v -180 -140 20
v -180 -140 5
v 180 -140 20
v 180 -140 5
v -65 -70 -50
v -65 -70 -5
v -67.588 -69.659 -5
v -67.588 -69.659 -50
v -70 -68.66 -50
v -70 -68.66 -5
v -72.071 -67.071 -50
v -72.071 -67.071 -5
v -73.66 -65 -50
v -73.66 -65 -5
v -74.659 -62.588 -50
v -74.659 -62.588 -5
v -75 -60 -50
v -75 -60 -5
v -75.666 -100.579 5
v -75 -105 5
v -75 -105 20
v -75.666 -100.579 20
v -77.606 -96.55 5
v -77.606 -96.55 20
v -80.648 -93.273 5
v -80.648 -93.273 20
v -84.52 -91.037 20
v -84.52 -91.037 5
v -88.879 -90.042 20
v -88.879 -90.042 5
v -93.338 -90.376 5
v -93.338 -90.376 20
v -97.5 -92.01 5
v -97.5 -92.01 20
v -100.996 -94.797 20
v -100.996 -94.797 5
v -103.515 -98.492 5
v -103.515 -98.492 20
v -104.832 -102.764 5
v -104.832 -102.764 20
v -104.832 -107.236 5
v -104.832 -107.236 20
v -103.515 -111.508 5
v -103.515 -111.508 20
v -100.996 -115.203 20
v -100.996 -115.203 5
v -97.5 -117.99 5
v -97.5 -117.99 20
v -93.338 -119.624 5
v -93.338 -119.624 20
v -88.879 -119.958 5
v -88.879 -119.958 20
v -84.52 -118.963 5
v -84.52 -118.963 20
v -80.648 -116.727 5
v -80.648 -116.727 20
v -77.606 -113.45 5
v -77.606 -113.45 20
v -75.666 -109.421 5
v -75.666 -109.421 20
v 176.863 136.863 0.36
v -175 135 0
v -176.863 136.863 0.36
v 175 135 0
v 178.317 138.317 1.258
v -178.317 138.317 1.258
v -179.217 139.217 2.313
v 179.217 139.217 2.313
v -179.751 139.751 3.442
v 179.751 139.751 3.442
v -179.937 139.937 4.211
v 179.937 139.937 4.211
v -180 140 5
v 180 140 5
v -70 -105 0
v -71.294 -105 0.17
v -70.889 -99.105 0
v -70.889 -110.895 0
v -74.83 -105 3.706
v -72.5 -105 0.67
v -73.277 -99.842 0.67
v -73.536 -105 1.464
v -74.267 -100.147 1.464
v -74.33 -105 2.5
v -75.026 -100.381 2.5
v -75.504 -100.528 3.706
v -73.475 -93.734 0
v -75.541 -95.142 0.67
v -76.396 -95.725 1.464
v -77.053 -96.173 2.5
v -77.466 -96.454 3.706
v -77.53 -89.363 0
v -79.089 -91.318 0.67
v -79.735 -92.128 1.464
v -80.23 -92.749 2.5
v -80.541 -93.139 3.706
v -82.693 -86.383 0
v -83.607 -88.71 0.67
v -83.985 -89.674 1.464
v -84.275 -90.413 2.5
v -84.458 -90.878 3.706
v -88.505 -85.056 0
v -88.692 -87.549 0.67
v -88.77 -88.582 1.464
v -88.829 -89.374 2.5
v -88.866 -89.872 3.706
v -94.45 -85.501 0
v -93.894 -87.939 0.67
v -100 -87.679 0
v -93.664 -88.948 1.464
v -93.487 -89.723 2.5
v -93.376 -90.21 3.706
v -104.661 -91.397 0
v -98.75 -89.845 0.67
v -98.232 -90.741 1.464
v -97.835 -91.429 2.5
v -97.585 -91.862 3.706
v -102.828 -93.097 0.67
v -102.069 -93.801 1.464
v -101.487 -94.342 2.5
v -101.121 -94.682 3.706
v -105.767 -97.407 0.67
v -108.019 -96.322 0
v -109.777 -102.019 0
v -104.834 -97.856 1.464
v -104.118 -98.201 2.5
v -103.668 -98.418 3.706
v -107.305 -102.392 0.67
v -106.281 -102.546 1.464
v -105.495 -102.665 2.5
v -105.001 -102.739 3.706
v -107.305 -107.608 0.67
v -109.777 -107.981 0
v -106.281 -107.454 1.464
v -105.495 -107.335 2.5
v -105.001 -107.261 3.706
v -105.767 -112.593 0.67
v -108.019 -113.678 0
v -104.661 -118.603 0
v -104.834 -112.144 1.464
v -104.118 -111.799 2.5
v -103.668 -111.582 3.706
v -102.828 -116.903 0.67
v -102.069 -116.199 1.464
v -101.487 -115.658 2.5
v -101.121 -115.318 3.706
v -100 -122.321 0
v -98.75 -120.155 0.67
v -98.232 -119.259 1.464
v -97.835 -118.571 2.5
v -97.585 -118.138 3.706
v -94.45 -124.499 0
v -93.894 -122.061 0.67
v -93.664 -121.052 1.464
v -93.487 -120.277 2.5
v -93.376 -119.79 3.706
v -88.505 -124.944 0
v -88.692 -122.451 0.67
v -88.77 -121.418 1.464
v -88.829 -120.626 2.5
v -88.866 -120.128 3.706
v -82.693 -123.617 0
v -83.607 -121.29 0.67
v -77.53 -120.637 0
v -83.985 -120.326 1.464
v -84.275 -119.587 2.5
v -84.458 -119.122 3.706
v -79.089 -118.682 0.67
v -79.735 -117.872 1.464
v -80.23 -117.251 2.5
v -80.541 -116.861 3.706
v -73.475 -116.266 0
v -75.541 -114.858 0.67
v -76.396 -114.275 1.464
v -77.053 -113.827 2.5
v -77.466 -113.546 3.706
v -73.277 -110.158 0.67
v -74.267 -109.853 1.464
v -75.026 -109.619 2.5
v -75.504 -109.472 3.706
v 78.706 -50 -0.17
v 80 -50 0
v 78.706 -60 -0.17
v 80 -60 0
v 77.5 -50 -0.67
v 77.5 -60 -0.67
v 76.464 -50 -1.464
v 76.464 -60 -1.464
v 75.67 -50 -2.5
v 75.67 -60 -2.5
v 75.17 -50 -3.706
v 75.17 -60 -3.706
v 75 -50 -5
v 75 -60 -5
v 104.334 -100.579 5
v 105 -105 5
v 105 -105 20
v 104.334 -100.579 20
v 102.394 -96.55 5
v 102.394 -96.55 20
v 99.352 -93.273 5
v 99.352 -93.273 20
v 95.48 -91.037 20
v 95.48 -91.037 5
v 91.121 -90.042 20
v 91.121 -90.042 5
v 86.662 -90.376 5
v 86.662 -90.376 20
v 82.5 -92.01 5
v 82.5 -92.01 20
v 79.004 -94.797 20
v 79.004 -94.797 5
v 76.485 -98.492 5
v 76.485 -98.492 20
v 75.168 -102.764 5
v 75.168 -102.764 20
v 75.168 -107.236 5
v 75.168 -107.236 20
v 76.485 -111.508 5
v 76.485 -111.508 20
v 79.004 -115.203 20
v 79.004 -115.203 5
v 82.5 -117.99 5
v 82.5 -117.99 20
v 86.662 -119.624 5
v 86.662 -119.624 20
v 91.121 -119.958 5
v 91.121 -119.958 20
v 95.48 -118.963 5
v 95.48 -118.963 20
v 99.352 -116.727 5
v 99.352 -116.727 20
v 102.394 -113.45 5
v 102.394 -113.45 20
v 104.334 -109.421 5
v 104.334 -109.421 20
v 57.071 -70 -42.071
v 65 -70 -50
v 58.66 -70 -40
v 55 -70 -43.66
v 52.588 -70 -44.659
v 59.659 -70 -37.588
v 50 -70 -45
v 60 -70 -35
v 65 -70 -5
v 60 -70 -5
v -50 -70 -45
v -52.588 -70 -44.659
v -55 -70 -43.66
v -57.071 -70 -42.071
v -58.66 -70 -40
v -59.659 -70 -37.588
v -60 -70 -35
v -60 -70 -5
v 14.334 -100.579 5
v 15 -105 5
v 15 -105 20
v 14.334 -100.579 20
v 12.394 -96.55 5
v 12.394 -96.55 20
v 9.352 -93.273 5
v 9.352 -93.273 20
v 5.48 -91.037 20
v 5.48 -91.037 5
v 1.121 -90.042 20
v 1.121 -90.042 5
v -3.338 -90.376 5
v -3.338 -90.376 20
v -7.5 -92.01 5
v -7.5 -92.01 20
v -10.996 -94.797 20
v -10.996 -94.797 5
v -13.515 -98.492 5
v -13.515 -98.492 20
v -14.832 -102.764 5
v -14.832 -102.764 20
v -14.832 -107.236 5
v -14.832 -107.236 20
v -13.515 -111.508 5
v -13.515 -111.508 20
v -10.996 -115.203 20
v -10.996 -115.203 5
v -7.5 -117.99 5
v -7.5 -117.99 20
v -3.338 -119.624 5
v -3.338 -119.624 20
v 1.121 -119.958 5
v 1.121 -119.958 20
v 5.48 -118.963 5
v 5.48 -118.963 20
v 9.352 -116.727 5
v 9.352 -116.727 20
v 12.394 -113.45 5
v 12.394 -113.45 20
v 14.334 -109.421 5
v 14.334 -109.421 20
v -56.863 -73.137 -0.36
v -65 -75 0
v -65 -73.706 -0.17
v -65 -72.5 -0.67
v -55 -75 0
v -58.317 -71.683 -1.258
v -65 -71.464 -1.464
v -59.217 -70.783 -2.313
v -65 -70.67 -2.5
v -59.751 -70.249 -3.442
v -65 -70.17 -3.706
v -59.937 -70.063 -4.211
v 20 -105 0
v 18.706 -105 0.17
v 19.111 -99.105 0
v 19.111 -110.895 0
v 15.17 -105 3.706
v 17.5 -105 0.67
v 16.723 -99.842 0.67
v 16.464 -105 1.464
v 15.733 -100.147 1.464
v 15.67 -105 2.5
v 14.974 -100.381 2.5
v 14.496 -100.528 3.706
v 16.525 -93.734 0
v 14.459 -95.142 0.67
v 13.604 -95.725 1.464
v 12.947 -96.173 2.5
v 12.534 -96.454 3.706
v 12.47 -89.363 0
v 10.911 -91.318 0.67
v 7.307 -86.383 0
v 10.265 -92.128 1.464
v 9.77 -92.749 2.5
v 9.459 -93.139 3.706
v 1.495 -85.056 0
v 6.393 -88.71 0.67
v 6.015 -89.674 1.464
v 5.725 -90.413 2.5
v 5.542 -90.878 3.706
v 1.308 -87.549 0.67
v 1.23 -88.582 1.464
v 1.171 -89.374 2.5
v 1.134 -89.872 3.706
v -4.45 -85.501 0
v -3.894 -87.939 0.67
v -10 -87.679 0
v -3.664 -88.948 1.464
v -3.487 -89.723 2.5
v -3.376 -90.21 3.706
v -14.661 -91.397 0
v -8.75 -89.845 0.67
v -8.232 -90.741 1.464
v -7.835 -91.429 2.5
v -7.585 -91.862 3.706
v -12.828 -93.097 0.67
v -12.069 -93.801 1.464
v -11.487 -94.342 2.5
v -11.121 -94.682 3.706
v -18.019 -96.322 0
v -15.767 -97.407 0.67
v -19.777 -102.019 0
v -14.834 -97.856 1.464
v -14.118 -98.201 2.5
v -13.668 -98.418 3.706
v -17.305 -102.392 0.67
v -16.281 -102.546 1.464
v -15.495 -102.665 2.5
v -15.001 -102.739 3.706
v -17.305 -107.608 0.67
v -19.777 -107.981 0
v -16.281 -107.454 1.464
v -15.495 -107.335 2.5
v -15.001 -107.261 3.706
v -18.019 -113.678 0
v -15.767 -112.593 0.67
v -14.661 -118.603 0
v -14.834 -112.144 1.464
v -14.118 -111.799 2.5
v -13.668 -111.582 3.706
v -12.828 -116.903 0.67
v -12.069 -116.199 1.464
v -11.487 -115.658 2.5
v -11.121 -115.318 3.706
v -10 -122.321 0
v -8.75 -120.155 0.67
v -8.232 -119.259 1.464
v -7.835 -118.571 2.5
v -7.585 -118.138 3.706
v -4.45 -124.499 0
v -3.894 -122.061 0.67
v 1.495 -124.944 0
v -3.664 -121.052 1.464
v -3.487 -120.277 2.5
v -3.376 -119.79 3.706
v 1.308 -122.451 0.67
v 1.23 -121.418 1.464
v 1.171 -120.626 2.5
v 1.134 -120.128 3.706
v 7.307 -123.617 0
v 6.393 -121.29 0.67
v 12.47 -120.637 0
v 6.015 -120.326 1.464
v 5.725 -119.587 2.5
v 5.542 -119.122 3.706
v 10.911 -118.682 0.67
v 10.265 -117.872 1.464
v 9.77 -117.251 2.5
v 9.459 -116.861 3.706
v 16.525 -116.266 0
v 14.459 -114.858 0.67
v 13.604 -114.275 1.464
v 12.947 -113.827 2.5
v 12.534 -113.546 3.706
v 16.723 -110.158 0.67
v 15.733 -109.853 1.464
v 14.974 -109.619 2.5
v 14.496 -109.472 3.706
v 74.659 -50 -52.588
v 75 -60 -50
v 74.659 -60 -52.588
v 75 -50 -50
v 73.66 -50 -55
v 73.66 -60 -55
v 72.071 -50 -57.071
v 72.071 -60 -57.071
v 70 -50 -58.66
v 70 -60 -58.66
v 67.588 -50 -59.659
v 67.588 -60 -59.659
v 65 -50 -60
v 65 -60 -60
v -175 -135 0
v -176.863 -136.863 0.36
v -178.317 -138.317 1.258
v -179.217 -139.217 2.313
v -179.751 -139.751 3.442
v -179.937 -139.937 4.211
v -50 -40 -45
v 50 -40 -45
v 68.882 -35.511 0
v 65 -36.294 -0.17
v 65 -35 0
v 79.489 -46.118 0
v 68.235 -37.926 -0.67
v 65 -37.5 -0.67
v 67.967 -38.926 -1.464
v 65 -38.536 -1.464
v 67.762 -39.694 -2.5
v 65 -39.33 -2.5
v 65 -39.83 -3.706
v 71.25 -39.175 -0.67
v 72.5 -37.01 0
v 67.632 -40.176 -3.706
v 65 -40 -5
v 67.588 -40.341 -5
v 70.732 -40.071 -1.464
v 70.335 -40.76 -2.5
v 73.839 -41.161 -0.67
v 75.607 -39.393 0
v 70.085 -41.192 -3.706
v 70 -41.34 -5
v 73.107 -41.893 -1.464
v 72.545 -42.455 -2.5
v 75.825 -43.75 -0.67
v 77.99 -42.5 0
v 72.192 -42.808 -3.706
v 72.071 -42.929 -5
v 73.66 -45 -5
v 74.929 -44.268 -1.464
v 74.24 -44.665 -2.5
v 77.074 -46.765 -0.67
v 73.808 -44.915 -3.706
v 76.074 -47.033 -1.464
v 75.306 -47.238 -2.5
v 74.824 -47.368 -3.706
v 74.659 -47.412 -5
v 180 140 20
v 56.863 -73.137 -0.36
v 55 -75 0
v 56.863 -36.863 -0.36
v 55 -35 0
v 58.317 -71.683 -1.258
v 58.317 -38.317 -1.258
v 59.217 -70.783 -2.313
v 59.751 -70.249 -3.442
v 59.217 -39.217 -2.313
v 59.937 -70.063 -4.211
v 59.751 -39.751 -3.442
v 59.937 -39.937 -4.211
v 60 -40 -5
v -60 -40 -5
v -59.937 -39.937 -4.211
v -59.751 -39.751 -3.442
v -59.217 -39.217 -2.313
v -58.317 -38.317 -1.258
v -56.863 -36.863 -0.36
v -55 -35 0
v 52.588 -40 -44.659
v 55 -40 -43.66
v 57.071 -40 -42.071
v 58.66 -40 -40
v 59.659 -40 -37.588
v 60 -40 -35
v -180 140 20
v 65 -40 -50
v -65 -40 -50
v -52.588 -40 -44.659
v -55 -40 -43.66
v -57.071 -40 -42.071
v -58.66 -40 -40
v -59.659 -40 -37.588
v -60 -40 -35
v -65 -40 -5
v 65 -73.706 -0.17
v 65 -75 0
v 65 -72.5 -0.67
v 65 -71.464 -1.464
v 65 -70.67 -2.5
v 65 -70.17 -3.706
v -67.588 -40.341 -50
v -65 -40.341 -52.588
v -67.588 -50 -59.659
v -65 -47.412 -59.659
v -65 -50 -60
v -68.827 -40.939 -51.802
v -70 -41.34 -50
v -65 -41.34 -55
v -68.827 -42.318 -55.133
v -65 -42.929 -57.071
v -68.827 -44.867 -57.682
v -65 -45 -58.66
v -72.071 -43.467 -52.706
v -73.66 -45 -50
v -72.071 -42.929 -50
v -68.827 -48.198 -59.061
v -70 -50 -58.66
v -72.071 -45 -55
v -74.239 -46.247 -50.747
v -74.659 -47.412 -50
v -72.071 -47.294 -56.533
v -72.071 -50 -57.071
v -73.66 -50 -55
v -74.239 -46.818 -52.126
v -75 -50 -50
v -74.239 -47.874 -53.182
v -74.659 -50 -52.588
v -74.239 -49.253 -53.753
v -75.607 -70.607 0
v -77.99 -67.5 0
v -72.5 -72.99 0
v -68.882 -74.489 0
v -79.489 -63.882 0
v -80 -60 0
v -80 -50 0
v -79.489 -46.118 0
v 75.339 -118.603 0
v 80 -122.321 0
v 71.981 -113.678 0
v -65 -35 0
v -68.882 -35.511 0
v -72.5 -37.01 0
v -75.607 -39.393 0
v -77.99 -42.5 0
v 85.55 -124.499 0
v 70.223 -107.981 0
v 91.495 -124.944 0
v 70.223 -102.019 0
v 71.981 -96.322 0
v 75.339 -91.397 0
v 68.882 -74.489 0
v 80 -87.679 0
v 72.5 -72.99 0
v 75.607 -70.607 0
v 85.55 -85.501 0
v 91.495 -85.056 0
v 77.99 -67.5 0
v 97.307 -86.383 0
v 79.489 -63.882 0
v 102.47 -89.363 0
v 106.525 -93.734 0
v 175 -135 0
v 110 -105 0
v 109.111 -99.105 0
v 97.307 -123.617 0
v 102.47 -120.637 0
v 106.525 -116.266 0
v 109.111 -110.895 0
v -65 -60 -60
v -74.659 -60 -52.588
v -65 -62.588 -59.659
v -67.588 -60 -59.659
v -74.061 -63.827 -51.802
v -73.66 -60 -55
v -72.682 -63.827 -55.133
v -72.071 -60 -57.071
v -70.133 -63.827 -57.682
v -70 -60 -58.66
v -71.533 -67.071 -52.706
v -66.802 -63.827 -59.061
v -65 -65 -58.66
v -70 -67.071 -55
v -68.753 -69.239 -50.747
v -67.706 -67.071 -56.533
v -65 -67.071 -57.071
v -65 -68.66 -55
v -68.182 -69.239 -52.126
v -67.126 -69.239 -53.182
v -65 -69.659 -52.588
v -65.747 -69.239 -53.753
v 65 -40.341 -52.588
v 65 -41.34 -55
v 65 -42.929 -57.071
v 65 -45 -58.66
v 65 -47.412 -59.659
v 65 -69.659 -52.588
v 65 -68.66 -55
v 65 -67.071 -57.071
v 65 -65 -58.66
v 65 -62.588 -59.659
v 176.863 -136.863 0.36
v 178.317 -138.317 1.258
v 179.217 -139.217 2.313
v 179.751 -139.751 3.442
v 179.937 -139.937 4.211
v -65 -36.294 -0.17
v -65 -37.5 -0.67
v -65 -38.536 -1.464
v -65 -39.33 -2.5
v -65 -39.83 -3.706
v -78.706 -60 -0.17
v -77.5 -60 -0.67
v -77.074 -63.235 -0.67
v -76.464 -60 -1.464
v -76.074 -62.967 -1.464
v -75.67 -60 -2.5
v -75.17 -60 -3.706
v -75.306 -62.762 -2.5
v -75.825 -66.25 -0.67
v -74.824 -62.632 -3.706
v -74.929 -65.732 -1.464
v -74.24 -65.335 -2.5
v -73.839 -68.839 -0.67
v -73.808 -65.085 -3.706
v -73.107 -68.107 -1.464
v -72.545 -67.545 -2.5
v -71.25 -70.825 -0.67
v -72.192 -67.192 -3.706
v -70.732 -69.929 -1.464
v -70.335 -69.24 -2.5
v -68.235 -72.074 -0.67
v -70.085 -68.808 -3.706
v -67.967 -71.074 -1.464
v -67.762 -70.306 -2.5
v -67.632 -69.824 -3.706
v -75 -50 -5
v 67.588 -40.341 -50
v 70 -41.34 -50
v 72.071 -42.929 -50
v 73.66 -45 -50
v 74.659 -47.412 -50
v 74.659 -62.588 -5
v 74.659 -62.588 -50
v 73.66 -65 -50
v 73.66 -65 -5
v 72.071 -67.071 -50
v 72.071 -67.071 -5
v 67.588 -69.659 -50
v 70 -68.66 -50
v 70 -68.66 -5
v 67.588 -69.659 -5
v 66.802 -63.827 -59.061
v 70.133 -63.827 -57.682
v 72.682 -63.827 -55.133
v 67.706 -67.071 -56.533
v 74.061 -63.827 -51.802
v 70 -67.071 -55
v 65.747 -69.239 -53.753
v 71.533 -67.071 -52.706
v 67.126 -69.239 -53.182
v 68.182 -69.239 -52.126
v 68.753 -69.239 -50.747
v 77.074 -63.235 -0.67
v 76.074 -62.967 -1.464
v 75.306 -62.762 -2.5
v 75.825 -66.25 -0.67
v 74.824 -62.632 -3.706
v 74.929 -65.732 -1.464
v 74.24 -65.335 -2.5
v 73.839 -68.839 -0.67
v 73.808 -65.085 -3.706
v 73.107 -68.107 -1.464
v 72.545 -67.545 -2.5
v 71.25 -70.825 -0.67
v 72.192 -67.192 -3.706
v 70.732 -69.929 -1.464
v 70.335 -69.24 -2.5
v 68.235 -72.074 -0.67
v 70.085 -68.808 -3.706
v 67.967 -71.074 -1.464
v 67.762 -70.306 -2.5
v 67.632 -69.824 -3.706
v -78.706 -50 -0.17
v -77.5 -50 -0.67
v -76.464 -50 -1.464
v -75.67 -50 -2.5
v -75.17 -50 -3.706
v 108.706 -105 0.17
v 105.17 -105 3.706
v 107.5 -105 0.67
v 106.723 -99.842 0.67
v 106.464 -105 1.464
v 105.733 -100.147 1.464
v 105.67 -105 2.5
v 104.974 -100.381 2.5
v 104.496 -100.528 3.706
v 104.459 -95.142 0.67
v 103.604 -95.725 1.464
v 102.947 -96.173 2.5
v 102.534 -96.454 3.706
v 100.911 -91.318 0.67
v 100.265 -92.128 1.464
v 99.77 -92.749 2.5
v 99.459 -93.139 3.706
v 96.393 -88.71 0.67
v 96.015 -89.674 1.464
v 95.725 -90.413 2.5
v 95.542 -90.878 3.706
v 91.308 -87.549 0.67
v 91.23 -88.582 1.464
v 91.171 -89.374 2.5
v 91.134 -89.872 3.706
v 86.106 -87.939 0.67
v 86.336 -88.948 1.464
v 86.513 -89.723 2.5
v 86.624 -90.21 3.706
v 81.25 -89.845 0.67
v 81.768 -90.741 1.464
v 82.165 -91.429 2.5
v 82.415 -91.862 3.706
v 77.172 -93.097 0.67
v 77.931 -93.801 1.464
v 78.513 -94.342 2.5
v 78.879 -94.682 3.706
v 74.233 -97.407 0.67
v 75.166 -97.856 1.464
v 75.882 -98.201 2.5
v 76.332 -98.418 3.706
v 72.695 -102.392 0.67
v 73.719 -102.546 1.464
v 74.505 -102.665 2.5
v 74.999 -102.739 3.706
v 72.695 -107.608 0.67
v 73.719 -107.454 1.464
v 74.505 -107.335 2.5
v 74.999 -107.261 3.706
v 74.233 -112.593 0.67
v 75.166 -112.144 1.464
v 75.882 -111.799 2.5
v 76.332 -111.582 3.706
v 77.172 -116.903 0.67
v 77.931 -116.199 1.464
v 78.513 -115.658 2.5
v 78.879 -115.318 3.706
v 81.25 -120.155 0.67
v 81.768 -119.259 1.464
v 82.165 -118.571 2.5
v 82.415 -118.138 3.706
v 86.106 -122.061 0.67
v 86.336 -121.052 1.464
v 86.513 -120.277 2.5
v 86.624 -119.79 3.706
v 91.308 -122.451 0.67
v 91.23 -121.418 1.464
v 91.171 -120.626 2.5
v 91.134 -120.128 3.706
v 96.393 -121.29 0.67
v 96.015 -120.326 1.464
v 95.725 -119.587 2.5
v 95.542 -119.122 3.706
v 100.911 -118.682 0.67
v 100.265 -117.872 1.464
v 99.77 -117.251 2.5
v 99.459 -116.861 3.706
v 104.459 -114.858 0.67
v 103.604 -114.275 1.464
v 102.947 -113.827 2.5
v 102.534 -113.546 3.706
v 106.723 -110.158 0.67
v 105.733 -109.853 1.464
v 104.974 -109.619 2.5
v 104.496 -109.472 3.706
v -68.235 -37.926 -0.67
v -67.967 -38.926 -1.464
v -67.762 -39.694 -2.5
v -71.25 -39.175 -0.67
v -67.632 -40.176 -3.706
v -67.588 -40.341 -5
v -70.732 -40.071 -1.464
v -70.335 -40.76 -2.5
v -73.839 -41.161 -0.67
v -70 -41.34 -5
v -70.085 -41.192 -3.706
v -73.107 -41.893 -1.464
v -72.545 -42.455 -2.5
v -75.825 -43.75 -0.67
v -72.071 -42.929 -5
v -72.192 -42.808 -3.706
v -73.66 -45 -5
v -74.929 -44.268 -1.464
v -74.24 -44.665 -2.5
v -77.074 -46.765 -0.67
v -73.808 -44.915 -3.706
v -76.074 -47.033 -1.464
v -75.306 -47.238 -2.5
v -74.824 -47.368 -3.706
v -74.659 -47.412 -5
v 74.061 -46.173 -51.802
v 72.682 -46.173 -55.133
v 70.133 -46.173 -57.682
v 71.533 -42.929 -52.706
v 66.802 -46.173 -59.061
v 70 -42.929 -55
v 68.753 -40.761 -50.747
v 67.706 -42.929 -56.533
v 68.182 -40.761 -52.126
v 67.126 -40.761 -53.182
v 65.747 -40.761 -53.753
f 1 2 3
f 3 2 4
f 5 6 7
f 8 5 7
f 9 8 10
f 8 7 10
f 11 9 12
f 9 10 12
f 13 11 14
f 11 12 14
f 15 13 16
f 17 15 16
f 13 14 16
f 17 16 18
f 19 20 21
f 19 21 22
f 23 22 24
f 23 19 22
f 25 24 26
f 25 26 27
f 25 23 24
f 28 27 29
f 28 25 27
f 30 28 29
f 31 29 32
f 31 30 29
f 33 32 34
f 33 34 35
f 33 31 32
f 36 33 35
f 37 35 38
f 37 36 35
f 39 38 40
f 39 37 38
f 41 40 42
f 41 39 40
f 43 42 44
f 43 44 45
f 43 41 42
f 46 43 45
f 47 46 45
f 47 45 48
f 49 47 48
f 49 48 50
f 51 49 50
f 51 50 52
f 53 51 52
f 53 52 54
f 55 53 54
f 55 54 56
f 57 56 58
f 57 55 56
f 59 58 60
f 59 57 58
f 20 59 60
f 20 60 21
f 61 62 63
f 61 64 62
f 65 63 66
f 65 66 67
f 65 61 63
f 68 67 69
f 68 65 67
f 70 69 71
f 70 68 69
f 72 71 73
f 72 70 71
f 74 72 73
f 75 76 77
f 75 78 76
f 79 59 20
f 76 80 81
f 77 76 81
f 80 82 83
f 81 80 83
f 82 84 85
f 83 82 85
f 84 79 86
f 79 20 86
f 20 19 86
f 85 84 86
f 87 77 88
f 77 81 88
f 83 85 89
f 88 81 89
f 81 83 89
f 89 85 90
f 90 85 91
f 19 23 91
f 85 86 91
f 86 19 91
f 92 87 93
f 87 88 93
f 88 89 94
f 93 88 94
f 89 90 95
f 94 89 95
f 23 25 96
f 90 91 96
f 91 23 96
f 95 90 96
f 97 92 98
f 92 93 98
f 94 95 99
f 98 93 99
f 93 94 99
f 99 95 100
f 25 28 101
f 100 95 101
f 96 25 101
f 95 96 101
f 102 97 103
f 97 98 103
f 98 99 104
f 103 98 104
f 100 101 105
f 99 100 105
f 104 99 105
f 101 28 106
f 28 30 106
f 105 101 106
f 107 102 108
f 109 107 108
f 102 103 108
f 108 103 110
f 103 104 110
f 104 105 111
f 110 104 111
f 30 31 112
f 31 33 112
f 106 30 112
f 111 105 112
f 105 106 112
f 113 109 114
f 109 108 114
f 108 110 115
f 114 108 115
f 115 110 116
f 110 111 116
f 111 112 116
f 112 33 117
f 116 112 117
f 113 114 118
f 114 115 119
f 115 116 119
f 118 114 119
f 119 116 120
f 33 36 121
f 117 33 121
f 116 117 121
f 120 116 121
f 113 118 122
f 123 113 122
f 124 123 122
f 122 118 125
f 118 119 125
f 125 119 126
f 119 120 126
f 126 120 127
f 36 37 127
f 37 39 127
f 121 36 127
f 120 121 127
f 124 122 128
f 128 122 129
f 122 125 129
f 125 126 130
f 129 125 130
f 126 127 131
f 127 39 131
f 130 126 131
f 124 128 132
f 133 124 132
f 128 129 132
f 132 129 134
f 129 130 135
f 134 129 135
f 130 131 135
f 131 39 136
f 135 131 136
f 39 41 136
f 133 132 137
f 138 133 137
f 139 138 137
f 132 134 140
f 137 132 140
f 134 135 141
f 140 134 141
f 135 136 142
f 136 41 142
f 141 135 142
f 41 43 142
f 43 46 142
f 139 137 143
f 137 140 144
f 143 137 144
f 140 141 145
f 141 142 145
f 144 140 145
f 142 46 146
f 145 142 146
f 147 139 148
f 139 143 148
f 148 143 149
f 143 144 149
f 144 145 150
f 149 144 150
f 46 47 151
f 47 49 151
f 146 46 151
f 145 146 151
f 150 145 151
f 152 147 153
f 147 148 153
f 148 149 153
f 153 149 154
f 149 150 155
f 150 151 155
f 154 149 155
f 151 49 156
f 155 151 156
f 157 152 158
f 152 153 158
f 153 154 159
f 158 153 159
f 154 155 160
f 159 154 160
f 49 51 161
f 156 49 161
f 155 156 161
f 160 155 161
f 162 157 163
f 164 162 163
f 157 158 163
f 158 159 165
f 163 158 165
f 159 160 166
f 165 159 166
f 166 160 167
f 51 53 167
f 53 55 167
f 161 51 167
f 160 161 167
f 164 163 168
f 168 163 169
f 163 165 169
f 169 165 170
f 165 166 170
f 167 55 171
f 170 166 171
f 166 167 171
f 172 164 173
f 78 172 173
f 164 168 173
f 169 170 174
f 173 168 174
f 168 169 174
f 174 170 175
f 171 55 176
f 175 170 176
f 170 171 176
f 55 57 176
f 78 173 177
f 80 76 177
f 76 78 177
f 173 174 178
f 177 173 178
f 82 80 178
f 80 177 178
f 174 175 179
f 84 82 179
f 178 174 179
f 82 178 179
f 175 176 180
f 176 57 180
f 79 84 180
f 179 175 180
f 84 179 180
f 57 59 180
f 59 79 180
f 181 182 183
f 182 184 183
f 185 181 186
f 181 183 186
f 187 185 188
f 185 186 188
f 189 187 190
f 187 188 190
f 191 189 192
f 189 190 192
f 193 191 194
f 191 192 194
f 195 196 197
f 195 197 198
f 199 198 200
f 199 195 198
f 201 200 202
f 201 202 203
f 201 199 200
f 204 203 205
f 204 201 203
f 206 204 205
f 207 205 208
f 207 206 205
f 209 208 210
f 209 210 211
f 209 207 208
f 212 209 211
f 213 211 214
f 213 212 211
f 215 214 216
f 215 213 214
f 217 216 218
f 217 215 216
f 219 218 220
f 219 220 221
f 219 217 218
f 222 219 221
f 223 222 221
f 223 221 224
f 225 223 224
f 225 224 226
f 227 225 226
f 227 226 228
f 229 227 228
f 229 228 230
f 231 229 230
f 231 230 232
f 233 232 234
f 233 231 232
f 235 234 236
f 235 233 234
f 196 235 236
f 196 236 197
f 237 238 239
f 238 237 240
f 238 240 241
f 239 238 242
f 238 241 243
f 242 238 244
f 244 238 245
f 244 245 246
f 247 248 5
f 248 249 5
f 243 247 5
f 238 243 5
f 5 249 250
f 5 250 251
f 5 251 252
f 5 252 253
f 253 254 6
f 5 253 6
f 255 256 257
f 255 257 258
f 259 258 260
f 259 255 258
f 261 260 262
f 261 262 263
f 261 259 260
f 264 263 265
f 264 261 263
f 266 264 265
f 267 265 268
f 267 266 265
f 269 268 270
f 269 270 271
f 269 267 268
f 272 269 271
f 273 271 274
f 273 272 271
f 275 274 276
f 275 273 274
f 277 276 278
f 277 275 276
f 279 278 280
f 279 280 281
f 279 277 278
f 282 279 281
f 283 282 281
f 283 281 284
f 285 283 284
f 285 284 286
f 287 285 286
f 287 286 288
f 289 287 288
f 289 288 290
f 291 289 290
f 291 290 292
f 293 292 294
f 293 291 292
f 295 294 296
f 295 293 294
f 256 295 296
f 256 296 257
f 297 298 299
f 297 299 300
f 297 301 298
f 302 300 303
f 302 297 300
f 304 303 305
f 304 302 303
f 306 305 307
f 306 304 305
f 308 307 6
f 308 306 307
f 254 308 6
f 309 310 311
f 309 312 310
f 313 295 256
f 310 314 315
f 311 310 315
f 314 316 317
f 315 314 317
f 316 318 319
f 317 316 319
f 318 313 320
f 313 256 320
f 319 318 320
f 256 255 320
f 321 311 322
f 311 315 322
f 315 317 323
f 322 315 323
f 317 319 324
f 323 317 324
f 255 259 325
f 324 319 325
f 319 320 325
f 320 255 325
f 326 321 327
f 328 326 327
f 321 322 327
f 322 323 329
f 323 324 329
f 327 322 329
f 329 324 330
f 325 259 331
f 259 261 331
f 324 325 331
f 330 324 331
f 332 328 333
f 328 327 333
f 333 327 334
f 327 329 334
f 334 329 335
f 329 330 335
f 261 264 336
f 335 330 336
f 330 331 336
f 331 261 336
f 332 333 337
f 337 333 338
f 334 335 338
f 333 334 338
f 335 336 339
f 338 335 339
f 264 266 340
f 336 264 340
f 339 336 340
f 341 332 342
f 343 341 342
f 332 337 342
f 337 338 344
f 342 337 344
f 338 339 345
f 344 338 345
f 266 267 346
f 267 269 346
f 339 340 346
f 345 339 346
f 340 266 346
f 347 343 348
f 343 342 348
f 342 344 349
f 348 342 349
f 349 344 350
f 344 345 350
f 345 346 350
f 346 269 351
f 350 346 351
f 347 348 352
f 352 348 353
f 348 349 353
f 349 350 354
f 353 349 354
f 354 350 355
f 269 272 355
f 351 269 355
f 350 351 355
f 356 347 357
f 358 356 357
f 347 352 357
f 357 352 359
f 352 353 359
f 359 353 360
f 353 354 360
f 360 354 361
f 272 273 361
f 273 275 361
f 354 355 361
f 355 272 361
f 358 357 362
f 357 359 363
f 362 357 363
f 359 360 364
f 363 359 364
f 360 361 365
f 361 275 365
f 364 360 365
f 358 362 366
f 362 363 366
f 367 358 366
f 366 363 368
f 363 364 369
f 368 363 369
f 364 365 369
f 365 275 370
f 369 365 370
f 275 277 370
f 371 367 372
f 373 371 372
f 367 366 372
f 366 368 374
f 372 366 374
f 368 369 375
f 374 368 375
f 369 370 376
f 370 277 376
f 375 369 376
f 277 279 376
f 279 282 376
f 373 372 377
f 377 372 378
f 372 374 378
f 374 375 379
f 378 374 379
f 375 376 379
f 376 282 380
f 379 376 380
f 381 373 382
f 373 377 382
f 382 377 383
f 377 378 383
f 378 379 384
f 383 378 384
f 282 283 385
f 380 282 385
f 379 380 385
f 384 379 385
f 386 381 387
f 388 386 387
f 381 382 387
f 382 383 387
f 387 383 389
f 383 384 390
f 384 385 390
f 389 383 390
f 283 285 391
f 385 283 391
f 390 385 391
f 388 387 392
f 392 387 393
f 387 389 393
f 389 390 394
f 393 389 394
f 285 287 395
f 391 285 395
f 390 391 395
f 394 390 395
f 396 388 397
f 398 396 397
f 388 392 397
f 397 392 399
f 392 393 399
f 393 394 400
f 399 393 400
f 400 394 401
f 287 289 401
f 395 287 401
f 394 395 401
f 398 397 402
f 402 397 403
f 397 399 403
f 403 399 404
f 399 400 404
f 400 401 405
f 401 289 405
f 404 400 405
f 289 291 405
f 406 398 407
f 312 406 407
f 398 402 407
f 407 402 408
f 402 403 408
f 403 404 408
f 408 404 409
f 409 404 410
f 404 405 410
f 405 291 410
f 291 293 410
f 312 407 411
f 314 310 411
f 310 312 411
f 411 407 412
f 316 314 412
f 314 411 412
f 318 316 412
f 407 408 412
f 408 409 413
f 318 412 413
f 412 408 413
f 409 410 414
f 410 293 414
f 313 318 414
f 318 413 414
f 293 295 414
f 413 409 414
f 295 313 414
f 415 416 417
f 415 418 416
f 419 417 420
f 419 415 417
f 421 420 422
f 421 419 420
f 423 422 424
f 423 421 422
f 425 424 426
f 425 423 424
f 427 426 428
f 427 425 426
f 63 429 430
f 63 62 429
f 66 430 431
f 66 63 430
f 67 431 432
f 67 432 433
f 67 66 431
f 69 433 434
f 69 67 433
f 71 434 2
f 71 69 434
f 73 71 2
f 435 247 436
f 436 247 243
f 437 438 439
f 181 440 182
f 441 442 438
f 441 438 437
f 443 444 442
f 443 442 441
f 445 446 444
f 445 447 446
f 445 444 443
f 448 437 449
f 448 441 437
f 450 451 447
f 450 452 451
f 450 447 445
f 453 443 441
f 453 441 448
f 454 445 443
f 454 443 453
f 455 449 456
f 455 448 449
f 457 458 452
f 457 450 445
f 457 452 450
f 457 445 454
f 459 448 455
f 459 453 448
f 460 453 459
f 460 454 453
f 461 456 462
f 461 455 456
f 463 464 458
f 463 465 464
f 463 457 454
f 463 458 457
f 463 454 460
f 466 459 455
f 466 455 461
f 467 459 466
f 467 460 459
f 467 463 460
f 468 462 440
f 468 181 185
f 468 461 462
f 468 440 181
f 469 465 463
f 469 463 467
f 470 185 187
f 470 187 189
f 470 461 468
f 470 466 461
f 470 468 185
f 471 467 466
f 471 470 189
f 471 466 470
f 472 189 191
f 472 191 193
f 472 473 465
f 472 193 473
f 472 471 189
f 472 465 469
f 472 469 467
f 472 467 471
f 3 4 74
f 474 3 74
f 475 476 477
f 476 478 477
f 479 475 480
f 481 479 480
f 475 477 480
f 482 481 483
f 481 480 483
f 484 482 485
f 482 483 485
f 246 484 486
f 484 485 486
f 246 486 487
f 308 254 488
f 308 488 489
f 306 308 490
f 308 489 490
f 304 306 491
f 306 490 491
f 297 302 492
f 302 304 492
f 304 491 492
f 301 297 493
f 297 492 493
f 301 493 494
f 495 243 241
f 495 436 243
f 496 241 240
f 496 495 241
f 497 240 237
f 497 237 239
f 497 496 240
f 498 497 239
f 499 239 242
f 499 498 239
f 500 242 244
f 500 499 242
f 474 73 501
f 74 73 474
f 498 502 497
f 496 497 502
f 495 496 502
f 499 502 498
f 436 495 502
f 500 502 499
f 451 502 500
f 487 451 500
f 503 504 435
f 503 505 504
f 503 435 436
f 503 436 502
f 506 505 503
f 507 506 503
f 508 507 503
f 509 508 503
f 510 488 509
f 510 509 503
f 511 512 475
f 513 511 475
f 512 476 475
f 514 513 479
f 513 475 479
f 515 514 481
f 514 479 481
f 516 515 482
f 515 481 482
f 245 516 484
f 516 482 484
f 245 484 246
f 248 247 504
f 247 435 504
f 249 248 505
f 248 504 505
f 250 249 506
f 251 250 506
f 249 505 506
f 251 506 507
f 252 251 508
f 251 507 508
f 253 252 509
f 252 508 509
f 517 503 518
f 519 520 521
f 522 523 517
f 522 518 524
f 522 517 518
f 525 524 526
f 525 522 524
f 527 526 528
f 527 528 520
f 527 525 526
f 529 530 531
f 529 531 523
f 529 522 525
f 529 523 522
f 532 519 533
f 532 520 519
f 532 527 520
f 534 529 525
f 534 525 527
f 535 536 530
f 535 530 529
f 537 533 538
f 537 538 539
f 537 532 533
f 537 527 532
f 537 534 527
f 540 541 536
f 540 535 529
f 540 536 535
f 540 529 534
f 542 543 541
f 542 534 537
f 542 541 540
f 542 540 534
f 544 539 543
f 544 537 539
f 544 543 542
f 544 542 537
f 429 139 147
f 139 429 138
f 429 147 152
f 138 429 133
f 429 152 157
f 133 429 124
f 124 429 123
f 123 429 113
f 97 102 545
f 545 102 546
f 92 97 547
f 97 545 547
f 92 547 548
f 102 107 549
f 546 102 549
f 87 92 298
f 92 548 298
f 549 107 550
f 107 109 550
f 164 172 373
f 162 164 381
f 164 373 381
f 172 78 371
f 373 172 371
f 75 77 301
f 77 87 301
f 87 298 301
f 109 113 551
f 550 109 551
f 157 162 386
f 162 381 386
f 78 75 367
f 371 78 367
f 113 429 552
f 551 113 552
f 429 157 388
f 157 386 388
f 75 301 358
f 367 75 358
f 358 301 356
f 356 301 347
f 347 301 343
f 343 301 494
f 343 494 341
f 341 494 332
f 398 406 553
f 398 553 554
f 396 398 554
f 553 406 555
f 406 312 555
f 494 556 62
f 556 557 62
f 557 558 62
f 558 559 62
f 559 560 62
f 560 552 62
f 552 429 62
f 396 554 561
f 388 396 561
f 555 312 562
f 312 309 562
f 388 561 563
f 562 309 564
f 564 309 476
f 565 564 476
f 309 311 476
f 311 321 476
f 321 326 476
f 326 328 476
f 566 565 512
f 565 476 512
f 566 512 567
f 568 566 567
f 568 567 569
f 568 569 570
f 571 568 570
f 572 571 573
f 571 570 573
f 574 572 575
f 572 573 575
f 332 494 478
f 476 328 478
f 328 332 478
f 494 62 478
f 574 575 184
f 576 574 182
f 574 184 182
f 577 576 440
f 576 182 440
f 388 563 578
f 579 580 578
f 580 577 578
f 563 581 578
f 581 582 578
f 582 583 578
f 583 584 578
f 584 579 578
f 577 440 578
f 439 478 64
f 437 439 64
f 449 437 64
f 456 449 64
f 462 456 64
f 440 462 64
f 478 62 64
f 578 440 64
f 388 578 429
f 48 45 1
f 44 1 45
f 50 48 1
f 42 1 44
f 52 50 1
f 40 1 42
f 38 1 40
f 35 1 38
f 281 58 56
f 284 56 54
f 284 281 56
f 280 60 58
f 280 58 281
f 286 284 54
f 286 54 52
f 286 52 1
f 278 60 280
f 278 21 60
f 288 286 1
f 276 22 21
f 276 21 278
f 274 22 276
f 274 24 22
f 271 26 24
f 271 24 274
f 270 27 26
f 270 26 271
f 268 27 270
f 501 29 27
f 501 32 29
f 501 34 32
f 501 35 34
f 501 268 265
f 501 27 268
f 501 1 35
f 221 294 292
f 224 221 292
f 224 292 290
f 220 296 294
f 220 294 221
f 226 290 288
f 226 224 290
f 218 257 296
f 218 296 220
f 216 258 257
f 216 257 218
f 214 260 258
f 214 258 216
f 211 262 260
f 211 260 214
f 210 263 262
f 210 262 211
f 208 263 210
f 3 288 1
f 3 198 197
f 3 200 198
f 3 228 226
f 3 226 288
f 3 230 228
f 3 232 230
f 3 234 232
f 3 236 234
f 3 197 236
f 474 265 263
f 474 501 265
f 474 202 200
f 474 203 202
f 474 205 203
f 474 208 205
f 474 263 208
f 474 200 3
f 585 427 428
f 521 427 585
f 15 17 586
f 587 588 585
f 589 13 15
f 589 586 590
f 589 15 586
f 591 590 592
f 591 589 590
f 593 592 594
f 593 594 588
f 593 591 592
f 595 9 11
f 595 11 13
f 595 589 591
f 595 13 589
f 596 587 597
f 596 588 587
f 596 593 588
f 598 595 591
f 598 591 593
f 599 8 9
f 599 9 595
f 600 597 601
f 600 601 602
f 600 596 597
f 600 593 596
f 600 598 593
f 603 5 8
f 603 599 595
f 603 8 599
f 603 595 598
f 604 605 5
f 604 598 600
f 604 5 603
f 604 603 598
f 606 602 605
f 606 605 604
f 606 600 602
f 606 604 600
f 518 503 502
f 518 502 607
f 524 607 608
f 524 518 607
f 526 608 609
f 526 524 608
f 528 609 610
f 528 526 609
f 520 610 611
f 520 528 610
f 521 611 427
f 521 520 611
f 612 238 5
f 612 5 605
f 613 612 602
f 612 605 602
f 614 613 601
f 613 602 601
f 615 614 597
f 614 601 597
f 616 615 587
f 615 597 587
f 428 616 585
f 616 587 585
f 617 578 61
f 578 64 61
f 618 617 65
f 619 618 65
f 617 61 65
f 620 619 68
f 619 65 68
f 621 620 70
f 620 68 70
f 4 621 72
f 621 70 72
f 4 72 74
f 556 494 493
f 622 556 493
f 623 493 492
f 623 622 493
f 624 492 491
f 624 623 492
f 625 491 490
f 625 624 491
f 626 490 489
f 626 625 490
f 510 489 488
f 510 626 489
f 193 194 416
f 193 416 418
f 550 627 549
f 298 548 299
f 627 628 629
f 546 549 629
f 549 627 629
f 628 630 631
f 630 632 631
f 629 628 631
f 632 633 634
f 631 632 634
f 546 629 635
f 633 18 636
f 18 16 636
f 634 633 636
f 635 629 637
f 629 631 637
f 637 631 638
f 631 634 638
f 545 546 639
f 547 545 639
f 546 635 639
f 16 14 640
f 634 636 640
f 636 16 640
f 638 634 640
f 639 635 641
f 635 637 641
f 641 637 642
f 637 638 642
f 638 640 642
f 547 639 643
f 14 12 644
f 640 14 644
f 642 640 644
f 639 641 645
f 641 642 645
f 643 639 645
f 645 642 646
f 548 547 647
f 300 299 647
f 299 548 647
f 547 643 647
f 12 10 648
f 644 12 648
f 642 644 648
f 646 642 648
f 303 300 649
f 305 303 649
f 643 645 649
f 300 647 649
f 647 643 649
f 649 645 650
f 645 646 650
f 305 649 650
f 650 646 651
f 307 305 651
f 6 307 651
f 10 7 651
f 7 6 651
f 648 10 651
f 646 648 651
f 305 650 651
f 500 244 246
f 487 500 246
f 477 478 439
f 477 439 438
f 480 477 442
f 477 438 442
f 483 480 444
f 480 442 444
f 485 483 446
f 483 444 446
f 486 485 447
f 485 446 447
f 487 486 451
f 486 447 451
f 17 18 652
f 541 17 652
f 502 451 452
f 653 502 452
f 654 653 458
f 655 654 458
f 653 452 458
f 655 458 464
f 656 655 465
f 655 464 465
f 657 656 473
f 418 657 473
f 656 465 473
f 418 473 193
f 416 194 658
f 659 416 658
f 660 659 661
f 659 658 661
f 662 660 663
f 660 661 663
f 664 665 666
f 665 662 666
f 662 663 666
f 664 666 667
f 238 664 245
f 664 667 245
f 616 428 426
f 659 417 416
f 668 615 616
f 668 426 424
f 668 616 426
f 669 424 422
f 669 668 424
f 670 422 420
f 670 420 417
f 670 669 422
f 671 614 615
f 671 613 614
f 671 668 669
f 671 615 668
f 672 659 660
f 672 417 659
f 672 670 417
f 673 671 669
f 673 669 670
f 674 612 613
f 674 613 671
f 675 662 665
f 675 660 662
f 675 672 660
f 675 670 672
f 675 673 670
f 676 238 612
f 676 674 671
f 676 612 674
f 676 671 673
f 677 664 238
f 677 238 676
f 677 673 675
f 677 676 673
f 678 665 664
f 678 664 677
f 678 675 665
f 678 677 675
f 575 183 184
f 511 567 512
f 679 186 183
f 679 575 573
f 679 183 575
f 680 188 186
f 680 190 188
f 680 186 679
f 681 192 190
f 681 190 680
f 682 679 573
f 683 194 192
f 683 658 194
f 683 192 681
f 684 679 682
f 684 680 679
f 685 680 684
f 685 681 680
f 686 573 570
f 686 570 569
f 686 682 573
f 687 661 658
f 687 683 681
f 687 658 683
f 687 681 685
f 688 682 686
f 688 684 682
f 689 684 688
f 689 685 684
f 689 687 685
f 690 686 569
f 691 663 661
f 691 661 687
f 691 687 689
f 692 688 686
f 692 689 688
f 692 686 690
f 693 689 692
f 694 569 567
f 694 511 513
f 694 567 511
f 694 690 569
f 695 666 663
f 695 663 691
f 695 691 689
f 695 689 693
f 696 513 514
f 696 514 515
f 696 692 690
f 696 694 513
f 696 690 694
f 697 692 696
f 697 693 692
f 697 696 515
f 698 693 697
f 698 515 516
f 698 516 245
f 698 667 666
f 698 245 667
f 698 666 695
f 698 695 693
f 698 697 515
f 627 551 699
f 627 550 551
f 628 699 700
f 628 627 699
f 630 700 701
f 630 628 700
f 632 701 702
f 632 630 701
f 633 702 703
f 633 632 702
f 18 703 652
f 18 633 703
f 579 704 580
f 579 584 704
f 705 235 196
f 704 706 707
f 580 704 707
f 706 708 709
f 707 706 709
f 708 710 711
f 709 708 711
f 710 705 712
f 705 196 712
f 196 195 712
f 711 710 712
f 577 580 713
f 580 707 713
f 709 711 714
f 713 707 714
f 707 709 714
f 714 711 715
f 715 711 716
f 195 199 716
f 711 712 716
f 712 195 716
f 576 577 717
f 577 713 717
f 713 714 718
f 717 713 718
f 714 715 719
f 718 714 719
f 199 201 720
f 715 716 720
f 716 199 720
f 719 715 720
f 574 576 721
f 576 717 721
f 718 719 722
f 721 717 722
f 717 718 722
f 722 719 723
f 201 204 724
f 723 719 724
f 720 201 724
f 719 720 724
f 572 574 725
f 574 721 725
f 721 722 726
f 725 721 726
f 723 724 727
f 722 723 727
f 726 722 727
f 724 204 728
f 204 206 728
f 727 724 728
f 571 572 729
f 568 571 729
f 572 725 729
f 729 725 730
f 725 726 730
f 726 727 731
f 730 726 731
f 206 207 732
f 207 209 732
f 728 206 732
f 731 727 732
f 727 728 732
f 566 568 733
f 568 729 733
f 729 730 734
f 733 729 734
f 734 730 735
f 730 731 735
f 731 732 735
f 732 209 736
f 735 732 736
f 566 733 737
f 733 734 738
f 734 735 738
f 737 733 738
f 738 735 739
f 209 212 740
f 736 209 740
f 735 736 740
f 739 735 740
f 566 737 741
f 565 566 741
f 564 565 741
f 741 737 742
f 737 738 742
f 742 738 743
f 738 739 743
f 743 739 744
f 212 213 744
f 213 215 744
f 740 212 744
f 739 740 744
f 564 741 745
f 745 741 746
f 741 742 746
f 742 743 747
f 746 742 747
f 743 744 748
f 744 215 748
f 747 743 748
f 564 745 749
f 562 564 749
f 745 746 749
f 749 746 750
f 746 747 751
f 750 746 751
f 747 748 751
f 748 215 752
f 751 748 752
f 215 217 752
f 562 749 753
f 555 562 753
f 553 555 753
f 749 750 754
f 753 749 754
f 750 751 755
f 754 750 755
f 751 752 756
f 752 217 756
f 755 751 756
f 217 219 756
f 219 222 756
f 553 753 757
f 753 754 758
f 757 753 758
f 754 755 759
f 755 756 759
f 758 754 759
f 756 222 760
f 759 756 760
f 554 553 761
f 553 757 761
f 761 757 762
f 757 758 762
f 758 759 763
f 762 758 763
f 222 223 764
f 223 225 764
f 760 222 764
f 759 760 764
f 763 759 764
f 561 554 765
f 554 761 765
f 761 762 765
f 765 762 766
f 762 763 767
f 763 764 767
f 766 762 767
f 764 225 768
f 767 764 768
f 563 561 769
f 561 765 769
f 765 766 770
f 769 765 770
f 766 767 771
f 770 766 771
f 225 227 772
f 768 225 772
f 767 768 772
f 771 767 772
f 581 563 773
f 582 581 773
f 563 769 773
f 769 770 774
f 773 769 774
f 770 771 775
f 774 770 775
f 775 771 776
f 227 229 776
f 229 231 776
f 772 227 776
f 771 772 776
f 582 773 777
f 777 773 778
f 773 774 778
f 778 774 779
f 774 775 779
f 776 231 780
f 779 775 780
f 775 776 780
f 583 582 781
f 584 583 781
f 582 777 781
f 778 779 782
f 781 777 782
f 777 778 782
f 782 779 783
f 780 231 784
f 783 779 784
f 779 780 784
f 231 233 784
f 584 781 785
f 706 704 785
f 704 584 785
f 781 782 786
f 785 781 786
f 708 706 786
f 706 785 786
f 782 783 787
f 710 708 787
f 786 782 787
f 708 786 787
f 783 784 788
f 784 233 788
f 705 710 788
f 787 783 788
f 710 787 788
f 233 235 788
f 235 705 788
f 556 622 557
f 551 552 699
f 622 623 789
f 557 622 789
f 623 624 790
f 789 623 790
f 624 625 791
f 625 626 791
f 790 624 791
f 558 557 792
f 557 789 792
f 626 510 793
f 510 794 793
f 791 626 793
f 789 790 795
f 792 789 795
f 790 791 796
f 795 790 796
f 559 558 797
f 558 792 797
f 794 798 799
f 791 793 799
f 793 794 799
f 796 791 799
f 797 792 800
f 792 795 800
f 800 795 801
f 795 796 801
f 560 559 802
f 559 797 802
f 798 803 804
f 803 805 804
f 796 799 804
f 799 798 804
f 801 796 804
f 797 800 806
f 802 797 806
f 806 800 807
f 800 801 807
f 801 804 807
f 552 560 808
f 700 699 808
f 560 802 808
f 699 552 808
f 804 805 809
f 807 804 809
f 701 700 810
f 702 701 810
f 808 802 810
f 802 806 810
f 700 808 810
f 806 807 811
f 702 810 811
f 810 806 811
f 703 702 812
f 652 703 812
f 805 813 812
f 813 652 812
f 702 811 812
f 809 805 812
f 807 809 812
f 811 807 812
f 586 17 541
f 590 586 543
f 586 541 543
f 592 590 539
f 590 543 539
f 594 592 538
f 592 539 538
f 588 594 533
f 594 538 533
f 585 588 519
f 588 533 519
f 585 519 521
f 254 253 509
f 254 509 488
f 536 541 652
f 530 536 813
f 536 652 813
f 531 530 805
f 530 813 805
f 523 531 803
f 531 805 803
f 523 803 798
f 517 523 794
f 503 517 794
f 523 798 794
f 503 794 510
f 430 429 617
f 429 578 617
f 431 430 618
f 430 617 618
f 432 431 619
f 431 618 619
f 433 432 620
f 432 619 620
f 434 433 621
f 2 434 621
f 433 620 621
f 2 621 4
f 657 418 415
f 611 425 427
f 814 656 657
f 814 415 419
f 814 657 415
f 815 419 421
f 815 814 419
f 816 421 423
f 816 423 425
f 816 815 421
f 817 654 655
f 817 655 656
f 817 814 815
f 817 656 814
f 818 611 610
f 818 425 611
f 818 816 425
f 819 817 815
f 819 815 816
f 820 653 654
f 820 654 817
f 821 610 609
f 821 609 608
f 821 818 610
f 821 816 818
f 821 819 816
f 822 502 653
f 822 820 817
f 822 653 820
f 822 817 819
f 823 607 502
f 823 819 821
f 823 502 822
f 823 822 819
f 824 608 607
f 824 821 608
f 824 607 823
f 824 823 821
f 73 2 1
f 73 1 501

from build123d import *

# Parameters (mm, degrees)
SCHIZZO1_W                   = 360
SCHIZZO1_H                   = 280
SCHIZZO1_R                   = 15
ESTRUSIONE_ESTRUSIONE1_DEPTH = 20
SCHIZZO2_W                   = 150
SCHIZZO2_H                   = 30
ESTRUSIONE_ESTRUSIONE2_DEPTH = 60
SCHIZZO3_W                   = 120
SCHIZZO3_H                   = 45
TAGLIO_ESTRUSIONE2_DEPTH     = 30
RACCORDO2_R                  = 10
RACCORDO3_R                  = 10
RACCORDO4_R                  = 10
RACCORDO5_R                  = 10
RACCORDO6_R                  = 10
RACCORDO7_R                  = 10
RACCORDO8_R                  = 10
RACCORDO12_R                 = 5


with BuildPart() as part:
    # Schizzo1 → Estrusione-Estrusione1 (new body)
    with BuildSketch(Plane.XY):
        Rectangle(SCHIZZO1_W, SCHIZZO1_H)
        with Locations((-90, -105)):
            Circle(SCHIZZO1_R, mode=Mode.SUBTRACT)
        with Locations((90, -105)):
            Circle(SCHIZZO1_R, mode=Mode.SUBTRACT)
        with Locations((0, -105)):
            Circle(SCHIZZO1_R, mode=Mode.SUBTRACT)
    extrude(amount=ESTRUSIONE_ESTRUSIONE1_DEPTH)

    # Schizzo2 → Estrusione-Estrusione2 (add)
    with BuildSketch(Plane(origin=(0, 0, 0), x_dir=(-1, 0, 0), z_dir=(0, 0, -1))):
        with Locations((0, -55)):
            Rectangle(SCHIZZO2_W, SCHIZZO2_H)
    extrude(amount=ESTRUSIONE_ESTRUSIONE2_DEPTH)

    # Schizzo3 → Taglio-Estrusione2 (cut)
    with BuildSketch(Plane.XZ.offset(70)):
        with Locations((0, -22.5)):
            Rectangle(SCHIZZO3_W, SCHIZZO3_H)
    extrude(amount=-TAGLIO_ESTRUSIONE2_DEPTH, mode=Mode.SUBTRACT)

    # Raccordo2
    raccordo2_edges = [part.edges().sort_by_distance(p)[0] for p in [
        (-75, -55, -60),
        (0, -40, -60),
        (75, -55, -60),
        (0, -70, -60),
    ]]
    fillet(raccordo2_edges, radius=RACCORDO2_R)

    # Raccordo3
    raccordo3_edges = [part.edges().sort_by_distance(p)[0] for p in [
        (60, -55, -45),
    ]]
    fillet(raccordo3_edges, radius=RACCORDO3_R)

    # Raccordo4
    raccordo4_edges = [part.edges().sort_by_distance(p)[0] for p in [
        (-60, -55, -45),
    ]]
    fillet(raccordo4_edges, radius=RACCORDO4_R)

    # Raccordo5
    # the kernel refuses this fillet: 10 mm, written as the material it takes off along each edge
    with BuildSketch(Plane(origin=(65, -60, -50), x_dir=(1, 0, 0), z_dir=(0, -1, 0))) as raccordo5_piece_1_section:
        Polygon((0, 0), (RACCORDO5_R, 0), (RACCORDO5_R, -RACCORDO5_R), (0, -RACCORDO5_R), align=None)
    raccordo5_piece_1 = extrude(amount=RACCORDO5_R, mode=Mode.PRIVATE)
    raccordo5_piece_1 = raccordo5_piece_1 - Plane(origin=(65, -60, -50), x_dir=(-0.7071067811865475, 0, 0.7071067811865475), z_dir=(0, -1, 0)) * Sphere(RACCORDO5_R, mode=Mode.PRIVATE)
    add(raccordo5_piece_1, mode=Mode.SUBTRACT)
    with BuildSketch(Plane(origin=(75, -70, 0), x_dir=(-1, 0, 0), z_dir=(0, 0, -1))) as raccordo5_piece_2:
        with BuildLine():
            CenterArc((RACCORDO5_R, RACCORDO5_R), RACCORDO5_R, 180, 90)
            Line((0, RACCORDO5_R), (0, 0))
            Line((0, 0), (RACCORDO5_R, 0))
        make_face()
    extrude(amount=50, mode=Mode.SUBTRACT)

    # Raccordo6
    # the kernel refuses this fillet: 10 mm, written as the material it takes off along each edge
    with BuildSketch(Plane(origin=(-65, -50, -50), x_dir=(0, 1, 0), z_dir=(-1, 0, 0))) as raccordo6_piece_1_section:
        Polygon((0, 0), (RACCORDO6_R, 0), (RACCORDO6_R, RACCORDO6_R), (0, RACCORDO6_R), align=None)
    raccordo6_piece_1 = extrude(amount=RACCORDO6_R, mode=Mode.PRIVATE)
    raccordo6_piece_1 = raccordo6_piece_1 - Plane(origin=(-65, -50, -50), x_dir=(0, -0.7071067811865475, 0.7071067811865475), z_dir=(-1, 0, 0)) * Sphere(RACCORDO6_R, mode=Mode.PRIVATE)
    add(raccordo6_piece_1, mode=Mode.SUBTRACT)
    with BuildSketch(Plane(origin=(-75, -40, 0), x_dir=(0, -1, 0), z_dir=(0, 0, -1))) as raccordo6_piece_2:
        with BuildLine():
            CenterArc((RACCORDO6_R, -RACCORDO6_R), RACCORDO6_R, 90, 90)
            Line((0, -RACCORDO6_R), (0, 0))
            Line((0, 0), (RACCORDO6_R, 0))
        make_face()
    extrude(amount=50, mode=Mode.SUBTRACT)

    # Raccordo7
    # the kernel refuses this fillet: 10 mm, written as the material it takes off along each edge
    with BuildSketch(Plane(origin=(65, -50, -50), x_dir=(1, 0, 0), z_dir=(0, 1, 0))) as raccordo7_piece_1_section:
        Polygon((0, 0), (RACCORDO7_R, 0), (RACCORDO7_R, RACCORDO7_R), (0, RACCORDO7_R), align=None)
    raccordo7_piece_1 = extrude(amount=RACCORDO7_R, mode=Mode.PRIVATE)
    raccordo7_piece_1 = raccordo7_piece_1 - Plane(origin=(65, -50, -50), x_dir=(-0.7071067811865475, 0, 0.7071067811865475), z_dir=(0, 1, 0)) * Sphere(RACCORDO7_R, mode=Mode.PRIVATE)
    add(raccordo7_piece_1, mode=Mode.SUBTRACT)
    with BuildSketch(Plane(origin=(75, -40, 0), x_dir=(-1, 0, 0), z_dir=(0, 0, -1))) as raccordo7_piece_2:
        with BuildLine():
            CenterArc((RACCORDO7_R, -RACCORDO7_R), RACCORDO7_R, 90, 90)
            Line((0, -RACCORDO7_R), (0, 0))
            Line((0, 0), (RACCORDO7_R, 0))
        make_face()
    extrude(amount=50, mode=Mode.SUBTRACT)

    # Raccordo8
    # the kernel refuses this fillet: 10 mm, written as the material it takes off along each edge
    with BuildSketch(Plane(origin=(-65, -60, -50), x_dir=(-1, 0, 0), z_dir=(0, -1, 0))) as raccordo8_piece_1_section:
        Polygon((0, 0), (RACCORDO8_R, 0), (RACCORDO8_R, RACCORDO8_R), (0, RACCORDO8_R), align=None)
    raccordo8_piece_1 = extrude(amount=RACCORDO8_R, mode=Mode.PRIVATE)
    raccordo8_piece_1 = raccordo8_piece_1 - Plane(origin=(-65, -60, -50), x_dir=(0.7071067811865475, 0, 0.7071067811865475), z_dir=(0, -1, 0)) * Sphere(RACCORDO8_R, mode=Mode.PRIVATE)
    add(raccordo8_piece_1, mode=Mode.SUBTRACT)
    with BuildSketch(Plane(origin=(-75, -70, 0), x_dir=(1, 0, 0), z_dir=(0, 0, -1))) as raccordo8_piece_2:
        with BuildLine():
            CenterArc((RACCORDO8_R, -RACCORDO8_R), RACCORDO8_R, 90, 90)
            Line((0, -RACCORDO8_R), (0, 0))
            Line((0, 0), (RACCORDO8_R, 0))
        make_face()
    extrude(amount=50, mode=Mode.SUBTRACT)

    # Raccordo12
    raccordo12_edges = [part.edges().sort_by_distance(p)[0] for p in [
        (72.071067812, -67.071067812, 0),
        (-62.5, -40, 0),
        (-72.071067812, -42.928932188, 0),
        (75, -55, 0),
        (72.071067812, -42.928932188, 0),
        (-105, -105, 0),
        (-75, -55, 0),
        (-72.071067812, -67.071067812, 0),
        (75, -105, 0),
        (-15, -105, 0),
        (-62.5, -70, 0),
        (62.5, -40, 0),
        (60, -55, 0),
        (-60, -55, 0),
        (0, -140, 0),
        (-180, 0, 0),
        (0, 140, 0),
        (180, 0, 0),
        (62.5, -70, 0),
    ]]
    fillet(raccordo12_edges, radius=RACCORDO12_R)


solid = part.part
